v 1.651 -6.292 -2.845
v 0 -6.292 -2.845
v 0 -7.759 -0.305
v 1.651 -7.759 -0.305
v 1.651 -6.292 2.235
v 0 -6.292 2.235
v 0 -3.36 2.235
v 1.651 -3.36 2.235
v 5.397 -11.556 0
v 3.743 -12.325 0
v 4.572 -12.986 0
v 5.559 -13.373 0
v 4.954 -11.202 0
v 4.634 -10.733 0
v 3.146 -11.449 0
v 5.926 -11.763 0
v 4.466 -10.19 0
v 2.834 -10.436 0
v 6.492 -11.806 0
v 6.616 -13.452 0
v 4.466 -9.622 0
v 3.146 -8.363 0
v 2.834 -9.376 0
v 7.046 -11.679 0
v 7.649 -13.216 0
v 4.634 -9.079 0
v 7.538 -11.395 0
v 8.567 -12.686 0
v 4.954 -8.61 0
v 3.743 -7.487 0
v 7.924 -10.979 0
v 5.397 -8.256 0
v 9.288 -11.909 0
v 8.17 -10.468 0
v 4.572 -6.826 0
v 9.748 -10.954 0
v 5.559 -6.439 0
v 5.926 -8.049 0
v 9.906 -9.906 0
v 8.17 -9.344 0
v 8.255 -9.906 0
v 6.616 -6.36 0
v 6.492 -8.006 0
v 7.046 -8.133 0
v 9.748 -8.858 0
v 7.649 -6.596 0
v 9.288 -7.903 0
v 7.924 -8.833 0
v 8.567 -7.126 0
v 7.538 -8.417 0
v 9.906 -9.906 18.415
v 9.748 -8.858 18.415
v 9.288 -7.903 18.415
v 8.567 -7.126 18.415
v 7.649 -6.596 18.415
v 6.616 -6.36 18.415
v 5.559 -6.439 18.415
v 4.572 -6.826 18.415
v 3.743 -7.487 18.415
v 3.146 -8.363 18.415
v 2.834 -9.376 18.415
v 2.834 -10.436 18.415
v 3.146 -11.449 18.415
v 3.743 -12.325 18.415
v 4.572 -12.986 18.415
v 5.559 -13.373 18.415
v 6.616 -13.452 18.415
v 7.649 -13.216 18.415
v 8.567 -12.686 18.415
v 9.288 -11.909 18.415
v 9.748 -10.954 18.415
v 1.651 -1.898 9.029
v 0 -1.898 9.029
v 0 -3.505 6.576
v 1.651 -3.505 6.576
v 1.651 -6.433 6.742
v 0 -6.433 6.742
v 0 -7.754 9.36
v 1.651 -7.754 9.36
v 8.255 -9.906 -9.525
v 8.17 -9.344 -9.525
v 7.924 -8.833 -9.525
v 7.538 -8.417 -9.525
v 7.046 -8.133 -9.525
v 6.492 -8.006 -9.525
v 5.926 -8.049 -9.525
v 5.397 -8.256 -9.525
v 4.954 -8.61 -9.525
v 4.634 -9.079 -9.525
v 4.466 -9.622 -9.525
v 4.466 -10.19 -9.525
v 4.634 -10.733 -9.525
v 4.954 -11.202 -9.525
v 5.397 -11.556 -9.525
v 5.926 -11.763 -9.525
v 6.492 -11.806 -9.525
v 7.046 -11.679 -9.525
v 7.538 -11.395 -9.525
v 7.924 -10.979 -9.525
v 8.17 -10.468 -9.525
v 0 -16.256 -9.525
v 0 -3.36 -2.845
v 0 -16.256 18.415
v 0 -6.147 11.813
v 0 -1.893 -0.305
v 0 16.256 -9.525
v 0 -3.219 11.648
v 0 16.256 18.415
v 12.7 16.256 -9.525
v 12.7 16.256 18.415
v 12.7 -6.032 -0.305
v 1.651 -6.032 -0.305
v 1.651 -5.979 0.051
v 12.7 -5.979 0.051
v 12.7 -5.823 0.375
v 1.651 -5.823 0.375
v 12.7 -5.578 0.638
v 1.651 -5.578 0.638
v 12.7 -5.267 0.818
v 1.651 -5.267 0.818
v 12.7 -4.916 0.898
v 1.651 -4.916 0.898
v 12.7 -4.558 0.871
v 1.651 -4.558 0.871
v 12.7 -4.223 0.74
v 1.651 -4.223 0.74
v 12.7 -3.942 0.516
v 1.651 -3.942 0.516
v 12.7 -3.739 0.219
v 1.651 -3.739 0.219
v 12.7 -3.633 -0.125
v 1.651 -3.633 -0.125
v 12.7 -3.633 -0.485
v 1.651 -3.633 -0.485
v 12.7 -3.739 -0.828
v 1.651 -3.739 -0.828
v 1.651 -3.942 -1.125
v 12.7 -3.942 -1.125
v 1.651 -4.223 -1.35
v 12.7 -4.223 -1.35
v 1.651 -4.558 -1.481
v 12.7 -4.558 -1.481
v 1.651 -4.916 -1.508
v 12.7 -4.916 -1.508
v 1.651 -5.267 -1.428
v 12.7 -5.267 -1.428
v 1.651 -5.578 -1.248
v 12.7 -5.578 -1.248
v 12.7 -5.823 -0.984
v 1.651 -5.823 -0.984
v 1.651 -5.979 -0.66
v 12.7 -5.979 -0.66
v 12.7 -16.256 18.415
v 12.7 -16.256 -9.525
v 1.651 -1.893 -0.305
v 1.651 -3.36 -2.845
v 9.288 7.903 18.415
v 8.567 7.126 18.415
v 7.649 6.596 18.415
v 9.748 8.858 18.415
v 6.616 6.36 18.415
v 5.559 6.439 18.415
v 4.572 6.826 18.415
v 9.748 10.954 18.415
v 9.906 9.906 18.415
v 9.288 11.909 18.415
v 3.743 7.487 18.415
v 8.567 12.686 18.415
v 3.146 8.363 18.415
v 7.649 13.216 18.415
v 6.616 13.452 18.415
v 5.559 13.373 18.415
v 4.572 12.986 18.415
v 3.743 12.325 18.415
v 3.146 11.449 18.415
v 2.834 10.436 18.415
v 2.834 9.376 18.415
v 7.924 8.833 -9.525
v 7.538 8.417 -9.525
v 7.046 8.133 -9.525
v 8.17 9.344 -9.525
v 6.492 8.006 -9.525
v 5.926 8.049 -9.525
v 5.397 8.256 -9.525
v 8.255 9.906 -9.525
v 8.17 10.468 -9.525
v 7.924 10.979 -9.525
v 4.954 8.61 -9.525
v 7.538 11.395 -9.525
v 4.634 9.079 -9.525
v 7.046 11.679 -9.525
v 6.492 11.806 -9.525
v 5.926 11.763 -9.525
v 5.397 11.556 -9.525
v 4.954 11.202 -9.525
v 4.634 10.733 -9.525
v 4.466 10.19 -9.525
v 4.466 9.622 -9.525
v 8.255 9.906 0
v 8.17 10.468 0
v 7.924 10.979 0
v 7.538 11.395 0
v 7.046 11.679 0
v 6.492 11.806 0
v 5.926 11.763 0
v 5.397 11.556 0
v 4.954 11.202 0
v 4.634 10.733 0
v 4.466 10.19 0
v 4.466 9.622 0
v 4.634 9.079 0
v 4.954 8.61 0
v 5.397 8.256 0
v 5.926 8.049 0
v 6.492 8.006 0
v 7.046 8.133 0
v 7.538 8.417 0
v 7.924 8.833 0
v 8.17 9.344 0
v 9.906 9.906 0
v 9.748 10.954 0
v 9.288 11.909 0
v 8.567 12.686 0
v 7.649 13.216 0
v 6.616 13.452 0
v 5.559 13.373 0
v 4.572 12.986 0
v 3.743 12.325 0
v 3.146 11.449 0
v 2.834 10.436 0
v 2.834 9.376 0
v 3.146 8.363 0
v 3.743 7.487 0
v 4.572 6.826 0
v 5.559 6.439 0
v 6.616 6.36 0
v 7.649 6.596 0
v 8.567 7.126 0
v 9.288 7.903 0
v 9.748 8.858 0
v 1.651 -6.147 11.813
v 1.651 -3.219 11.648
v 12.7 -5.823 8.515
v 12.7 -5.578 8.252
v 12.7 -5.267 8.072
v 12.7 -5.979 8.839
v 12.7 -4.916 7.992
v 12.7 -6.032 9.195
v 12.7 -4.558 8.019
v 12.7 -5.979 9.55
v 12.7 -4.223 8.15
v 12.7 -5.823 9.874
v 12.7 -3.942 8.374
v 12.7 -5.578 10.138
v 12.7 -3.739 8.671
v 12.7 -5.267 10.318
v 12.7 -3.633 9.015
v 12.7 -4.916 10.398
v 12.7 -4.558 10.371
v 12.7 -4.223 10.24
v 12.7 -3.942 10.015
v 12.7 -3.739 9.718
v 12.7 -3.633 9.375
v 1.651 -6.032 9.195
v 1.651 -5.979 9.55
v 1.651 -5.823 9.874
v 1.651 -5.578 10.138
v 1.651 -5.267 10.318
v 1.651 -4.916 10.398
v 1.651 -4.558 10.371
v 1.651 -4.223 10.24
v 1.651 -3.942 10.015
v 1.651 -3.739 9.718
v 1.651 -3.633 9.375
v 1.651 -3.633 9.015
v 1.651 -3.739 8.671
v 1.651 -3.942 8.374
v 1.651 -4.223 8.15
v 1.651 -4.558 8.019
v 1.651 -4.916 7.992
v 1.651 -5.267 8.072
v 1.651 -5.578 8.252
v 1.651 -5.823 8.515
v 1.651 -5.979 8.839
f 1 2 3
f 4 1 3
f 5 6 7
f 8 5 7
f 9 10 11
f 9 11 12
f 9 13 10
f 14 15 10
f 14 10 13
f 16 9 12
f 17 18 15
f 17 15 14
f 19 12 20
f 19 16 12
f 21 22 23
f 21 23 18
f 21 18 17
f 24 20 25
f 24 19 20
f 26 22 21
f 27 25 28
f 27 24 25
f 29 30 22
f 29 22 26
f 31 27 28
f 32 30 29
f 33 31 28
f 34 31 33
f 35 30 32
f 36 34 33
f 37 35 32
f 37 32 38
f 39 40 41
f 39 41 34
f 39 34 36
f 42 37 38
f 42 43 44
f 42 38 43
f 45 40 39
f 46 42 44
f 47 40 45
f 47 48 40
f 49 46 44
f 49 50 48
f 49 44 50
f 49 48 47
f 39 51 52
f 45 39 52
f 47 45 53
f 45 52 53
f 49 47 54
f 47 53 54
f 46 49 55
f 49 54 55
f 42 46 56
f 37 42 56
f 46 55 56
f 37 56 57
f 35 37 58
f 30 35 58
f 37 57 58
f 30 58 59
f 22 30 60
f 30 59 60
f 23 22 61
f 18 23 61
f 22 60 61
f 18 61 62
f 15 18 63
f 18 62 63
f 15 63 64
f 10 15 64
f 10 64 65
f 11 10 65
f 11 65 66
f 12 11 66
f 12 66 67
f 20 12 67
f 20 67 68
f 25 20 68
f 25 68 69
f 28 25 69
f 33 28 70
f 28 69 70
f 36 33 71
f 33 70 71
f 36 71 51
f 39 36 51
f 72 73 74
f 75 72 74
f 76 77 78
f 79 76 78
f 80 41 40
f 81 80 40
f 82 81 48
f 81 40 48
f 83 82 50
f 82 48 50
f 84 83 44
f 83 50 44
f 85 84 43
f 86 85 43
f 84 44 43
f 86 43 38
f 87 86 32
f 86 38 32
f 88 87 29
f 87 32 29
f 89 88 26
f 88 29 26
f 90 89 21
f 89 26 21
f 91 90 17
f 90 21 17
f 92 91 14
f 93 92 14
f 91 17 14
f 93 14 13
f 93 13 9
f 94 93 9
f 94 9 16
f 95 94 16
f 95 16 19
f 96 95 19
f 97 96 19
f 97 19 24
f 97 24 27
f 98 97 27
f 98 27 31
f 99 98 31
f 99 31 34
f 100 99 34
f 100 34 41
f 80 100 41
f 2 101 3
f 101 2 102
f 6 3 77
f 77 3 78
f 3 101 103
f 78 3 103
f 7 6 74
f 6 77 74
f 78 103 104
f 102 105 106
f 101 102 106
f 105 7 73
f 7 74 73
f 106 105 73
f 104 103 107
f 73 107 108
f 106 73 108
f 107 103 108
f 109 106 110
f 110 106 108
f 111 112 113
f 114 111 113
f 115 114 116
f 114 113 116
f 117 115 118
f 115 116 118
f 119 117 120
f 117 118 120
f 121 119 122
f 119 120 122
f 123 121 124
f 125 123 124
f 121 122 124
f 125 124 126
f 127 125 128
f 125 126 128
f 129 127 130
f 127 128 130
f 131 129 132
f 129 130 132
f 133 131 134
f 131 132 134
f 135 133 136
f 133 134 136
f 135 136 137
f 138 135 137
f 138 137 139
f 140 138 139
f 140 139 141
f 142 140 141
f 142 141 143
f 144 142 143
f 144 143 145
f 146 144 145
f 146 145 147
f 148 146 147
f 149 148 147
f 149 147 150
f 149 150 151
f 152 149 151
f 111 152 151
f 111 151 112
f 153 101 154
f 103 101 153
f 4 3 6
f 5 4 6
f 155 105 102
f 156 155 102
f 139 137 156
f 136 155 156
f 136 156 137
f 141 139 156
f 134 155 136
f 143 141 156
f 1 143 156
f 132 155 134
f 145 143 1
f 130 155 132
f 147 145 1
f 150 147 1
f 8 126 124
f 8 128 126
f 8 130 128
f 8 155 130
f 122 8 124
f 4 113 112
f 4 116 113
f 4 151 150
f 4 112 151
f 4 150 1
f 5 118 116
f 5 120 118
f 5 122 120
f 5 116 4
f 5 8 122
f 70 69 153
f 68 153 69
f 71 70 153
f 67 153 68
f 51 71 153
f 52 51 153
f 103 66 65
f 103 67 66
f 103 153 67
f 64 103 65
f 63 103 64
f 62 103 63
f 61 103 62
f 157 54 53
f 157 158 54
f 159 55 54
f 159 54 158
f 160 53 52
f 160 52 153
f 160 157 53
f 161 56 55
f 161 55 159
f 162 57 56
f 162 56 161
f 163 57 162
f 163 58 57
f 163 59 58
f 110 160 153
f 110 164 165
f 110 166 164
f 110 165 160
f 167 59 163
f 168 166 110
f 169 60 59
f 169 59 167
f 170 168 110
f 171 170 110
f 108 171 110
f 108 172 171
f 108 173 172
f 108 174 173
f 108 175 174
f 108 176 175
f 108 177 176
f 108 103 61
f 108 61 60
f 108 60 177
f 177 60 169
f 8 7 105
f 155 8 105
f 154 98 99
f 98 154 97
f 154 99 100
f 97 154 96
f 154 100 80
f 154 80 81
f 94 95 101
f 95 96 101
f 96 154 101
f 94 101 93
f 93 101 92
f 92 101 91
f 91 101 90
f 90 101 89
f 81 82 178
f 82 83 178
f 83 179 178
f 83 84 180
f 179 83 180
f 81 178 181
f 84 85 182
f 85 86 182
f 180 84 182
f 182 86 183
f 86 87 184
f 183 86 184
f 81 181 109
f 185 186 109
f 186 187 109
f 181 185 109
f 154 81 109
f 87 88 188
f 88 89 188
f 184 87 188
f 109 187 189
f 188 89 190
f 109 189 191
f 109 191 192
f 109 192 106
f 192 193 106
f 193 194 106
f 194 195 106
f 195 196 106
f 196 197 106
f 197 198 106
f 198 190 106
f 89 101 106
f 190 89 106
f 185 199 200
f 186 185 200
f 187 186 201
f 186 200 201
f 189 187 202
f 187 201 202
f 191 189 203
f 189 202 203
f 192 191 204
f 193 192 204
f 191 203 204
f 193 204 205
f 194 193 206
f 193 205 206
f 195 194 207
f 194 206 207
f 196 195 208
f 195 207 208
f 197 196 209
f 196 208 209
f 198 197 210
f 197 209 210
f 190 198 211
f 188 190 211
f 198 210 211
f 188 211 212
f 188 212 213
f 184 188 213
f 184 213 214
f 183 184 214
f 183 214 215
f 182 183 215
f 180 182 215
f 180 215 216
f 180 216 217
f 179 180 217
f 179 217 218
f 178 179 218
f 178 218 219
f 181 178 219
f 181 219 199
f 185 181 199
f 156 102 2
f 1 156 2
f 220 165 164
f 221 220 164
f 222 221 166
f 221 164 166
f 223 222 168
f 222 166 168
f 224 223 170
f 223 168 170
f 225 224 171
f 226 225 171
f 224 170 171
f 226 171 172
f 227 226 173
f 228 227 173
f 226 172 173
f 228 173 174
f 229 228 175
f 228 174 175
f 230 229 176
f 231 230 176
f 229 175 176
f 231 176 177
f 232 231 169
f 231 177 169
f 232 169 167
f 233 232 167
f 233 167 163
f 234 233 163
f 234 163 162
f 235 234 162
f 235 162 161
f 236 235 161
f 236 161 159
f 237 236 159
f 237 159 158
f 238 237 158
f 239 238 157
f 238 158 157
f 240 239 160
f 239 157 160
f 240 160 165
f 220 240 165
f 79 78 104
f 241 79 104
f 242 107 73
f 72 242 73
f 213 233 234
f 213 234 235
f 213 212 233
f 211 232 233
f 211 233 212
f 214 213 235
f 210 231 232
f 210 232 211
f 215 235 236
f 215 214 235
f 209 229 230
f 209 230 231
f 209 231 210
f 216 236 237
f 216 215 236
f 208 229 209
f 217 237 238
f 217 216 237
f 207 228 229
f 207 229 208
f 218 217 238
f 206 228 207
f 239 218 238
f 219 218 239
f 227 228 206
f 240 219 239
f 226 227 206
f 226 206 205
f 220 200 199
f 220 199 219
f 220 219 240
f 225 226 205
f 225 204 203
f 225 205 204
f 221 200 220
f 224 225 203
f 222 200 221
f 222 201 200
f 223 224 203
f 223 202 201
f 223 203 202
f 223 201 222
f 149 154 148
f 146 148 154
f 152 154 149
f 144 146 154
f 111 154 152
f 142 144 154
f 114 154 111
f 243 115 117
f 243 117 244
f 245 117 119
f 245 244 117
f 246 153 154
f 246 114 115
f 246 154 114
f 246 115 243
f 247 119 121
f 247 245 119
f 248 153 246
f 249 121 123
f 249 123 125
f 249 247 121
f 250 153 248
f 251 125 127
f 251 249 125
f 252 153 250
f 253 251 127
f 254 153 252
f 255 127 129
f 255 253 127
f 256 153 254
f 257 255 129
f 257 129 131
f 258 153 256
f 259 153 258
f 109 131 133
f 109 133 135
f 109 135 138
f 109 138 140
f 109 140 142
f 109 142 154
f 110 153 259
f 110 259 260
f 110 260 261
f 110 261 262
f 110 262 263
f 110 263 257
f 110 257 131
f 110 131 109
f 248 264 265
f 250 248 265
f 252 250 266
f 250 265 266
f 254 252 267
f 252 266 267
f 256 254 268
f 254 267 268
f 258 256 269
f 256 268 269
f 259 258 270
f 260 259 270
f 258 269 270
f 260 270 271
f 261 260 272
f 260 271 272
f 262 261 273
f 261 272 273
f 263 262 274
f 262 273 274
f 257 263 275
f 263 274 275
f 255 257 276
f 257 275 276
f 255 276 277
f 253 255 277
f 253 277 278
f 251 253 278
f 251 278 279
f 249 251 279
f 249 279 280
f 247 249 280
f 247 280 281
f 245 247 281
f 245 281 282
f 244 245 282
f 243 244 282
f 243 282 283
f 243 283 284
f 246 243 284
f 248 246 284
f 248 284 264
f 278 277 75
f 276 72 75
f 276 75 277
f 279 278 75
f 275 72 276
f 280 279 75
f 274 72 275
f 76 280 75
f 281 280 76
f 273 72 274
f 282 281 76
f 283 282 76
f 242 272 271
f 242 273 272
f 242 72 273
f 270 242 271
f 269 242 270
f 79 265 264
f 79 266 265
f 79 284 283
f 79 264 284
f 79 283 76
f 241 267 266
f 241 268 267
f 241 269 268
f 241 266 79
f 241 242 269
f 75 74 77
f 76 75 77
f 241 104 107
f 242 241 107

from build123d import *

# Parameters (mm, degrees)
F0_W     = 32.512
F0_H     = 27.94
F1_DEPTH = 12.7
F2_R     = 1.2065
F3_DEPTH = 12.701
F5_DEPTH = 1.651
F6_R     = 1.905
F7_DEPTH = 27.941
F8_R     = 3.556
F9_DEPTH = 18.415


with BuildPart() as f1:
    # F0 (on Right) → F1 (new body)
    with BuildSketch(Plane.YZ):
        with Locations((0, 4.445)):
            Rectangle(F0_W, F0_H)
    extrude(amount=F1_DEPTH)

    # F2 (on face) → F3 (cut, through all)
    with BuildSketch(Plane(origin=(0, 0, 0), x_dir=(0, -1, 0), z_dir=(-1, 0, 0))):
        with Locations((4.826, -0.3048)):
            Circle(F2_R)
        with Locations((4.826, 9.1948)):
            Circle(F2_R)
    extrude(amount=-F3_DEPTH, mode=Mode.SUBTRACT)

    # F4 (on face) → F5 (cut)
    with BuildSketch(Plane(origin=(0, 0, 0), x_dir=(0, -1, 0), z_dir=(-1, 0, 0))):
        Polygon((7.754274, 9.360161), (6.14693, 11.81344), (3.218656, 11.648079), (1.897726, 9.029439), (3.50507, 6.57616), (6.433344, 6.741521), align=None)
        Polygon((6.29247, 2.2352), (3.35953, 2.2352), (1.893061, -0.3048), (3.35953, -2.8448), (6.29247, -2.8448), (7.758939, -0.3048), align=None)
    extrude(amount=-F5_DEPTH, mode=Mode.SUBTRACT)

    # F6 (on face) → F7 (cut, through all)
    with BuildSketch(Plane.XY.offset(18.415)):
        with Locations((6.35, -9.906)):
            Circle(F6_R)
        with Locations((6.35, 9.906)):
            Circle(F6_R)
    extrude(amount=-F7_DEPTH, mode=Mode.SUBTRACT)

    # F8 (on face) → F9 (cut)
    with BuildSketch(Plane.XY.offset(18.415)):
        with Locations((6.35, 9.906)):
            Circle(F8_R)
        with Locations((6.35, -9.906)):
            Circle(F8_R)
    extrude(amount=-F9_DEPTH, mode=Mode.SUBTRACT)


solid = f1.part
